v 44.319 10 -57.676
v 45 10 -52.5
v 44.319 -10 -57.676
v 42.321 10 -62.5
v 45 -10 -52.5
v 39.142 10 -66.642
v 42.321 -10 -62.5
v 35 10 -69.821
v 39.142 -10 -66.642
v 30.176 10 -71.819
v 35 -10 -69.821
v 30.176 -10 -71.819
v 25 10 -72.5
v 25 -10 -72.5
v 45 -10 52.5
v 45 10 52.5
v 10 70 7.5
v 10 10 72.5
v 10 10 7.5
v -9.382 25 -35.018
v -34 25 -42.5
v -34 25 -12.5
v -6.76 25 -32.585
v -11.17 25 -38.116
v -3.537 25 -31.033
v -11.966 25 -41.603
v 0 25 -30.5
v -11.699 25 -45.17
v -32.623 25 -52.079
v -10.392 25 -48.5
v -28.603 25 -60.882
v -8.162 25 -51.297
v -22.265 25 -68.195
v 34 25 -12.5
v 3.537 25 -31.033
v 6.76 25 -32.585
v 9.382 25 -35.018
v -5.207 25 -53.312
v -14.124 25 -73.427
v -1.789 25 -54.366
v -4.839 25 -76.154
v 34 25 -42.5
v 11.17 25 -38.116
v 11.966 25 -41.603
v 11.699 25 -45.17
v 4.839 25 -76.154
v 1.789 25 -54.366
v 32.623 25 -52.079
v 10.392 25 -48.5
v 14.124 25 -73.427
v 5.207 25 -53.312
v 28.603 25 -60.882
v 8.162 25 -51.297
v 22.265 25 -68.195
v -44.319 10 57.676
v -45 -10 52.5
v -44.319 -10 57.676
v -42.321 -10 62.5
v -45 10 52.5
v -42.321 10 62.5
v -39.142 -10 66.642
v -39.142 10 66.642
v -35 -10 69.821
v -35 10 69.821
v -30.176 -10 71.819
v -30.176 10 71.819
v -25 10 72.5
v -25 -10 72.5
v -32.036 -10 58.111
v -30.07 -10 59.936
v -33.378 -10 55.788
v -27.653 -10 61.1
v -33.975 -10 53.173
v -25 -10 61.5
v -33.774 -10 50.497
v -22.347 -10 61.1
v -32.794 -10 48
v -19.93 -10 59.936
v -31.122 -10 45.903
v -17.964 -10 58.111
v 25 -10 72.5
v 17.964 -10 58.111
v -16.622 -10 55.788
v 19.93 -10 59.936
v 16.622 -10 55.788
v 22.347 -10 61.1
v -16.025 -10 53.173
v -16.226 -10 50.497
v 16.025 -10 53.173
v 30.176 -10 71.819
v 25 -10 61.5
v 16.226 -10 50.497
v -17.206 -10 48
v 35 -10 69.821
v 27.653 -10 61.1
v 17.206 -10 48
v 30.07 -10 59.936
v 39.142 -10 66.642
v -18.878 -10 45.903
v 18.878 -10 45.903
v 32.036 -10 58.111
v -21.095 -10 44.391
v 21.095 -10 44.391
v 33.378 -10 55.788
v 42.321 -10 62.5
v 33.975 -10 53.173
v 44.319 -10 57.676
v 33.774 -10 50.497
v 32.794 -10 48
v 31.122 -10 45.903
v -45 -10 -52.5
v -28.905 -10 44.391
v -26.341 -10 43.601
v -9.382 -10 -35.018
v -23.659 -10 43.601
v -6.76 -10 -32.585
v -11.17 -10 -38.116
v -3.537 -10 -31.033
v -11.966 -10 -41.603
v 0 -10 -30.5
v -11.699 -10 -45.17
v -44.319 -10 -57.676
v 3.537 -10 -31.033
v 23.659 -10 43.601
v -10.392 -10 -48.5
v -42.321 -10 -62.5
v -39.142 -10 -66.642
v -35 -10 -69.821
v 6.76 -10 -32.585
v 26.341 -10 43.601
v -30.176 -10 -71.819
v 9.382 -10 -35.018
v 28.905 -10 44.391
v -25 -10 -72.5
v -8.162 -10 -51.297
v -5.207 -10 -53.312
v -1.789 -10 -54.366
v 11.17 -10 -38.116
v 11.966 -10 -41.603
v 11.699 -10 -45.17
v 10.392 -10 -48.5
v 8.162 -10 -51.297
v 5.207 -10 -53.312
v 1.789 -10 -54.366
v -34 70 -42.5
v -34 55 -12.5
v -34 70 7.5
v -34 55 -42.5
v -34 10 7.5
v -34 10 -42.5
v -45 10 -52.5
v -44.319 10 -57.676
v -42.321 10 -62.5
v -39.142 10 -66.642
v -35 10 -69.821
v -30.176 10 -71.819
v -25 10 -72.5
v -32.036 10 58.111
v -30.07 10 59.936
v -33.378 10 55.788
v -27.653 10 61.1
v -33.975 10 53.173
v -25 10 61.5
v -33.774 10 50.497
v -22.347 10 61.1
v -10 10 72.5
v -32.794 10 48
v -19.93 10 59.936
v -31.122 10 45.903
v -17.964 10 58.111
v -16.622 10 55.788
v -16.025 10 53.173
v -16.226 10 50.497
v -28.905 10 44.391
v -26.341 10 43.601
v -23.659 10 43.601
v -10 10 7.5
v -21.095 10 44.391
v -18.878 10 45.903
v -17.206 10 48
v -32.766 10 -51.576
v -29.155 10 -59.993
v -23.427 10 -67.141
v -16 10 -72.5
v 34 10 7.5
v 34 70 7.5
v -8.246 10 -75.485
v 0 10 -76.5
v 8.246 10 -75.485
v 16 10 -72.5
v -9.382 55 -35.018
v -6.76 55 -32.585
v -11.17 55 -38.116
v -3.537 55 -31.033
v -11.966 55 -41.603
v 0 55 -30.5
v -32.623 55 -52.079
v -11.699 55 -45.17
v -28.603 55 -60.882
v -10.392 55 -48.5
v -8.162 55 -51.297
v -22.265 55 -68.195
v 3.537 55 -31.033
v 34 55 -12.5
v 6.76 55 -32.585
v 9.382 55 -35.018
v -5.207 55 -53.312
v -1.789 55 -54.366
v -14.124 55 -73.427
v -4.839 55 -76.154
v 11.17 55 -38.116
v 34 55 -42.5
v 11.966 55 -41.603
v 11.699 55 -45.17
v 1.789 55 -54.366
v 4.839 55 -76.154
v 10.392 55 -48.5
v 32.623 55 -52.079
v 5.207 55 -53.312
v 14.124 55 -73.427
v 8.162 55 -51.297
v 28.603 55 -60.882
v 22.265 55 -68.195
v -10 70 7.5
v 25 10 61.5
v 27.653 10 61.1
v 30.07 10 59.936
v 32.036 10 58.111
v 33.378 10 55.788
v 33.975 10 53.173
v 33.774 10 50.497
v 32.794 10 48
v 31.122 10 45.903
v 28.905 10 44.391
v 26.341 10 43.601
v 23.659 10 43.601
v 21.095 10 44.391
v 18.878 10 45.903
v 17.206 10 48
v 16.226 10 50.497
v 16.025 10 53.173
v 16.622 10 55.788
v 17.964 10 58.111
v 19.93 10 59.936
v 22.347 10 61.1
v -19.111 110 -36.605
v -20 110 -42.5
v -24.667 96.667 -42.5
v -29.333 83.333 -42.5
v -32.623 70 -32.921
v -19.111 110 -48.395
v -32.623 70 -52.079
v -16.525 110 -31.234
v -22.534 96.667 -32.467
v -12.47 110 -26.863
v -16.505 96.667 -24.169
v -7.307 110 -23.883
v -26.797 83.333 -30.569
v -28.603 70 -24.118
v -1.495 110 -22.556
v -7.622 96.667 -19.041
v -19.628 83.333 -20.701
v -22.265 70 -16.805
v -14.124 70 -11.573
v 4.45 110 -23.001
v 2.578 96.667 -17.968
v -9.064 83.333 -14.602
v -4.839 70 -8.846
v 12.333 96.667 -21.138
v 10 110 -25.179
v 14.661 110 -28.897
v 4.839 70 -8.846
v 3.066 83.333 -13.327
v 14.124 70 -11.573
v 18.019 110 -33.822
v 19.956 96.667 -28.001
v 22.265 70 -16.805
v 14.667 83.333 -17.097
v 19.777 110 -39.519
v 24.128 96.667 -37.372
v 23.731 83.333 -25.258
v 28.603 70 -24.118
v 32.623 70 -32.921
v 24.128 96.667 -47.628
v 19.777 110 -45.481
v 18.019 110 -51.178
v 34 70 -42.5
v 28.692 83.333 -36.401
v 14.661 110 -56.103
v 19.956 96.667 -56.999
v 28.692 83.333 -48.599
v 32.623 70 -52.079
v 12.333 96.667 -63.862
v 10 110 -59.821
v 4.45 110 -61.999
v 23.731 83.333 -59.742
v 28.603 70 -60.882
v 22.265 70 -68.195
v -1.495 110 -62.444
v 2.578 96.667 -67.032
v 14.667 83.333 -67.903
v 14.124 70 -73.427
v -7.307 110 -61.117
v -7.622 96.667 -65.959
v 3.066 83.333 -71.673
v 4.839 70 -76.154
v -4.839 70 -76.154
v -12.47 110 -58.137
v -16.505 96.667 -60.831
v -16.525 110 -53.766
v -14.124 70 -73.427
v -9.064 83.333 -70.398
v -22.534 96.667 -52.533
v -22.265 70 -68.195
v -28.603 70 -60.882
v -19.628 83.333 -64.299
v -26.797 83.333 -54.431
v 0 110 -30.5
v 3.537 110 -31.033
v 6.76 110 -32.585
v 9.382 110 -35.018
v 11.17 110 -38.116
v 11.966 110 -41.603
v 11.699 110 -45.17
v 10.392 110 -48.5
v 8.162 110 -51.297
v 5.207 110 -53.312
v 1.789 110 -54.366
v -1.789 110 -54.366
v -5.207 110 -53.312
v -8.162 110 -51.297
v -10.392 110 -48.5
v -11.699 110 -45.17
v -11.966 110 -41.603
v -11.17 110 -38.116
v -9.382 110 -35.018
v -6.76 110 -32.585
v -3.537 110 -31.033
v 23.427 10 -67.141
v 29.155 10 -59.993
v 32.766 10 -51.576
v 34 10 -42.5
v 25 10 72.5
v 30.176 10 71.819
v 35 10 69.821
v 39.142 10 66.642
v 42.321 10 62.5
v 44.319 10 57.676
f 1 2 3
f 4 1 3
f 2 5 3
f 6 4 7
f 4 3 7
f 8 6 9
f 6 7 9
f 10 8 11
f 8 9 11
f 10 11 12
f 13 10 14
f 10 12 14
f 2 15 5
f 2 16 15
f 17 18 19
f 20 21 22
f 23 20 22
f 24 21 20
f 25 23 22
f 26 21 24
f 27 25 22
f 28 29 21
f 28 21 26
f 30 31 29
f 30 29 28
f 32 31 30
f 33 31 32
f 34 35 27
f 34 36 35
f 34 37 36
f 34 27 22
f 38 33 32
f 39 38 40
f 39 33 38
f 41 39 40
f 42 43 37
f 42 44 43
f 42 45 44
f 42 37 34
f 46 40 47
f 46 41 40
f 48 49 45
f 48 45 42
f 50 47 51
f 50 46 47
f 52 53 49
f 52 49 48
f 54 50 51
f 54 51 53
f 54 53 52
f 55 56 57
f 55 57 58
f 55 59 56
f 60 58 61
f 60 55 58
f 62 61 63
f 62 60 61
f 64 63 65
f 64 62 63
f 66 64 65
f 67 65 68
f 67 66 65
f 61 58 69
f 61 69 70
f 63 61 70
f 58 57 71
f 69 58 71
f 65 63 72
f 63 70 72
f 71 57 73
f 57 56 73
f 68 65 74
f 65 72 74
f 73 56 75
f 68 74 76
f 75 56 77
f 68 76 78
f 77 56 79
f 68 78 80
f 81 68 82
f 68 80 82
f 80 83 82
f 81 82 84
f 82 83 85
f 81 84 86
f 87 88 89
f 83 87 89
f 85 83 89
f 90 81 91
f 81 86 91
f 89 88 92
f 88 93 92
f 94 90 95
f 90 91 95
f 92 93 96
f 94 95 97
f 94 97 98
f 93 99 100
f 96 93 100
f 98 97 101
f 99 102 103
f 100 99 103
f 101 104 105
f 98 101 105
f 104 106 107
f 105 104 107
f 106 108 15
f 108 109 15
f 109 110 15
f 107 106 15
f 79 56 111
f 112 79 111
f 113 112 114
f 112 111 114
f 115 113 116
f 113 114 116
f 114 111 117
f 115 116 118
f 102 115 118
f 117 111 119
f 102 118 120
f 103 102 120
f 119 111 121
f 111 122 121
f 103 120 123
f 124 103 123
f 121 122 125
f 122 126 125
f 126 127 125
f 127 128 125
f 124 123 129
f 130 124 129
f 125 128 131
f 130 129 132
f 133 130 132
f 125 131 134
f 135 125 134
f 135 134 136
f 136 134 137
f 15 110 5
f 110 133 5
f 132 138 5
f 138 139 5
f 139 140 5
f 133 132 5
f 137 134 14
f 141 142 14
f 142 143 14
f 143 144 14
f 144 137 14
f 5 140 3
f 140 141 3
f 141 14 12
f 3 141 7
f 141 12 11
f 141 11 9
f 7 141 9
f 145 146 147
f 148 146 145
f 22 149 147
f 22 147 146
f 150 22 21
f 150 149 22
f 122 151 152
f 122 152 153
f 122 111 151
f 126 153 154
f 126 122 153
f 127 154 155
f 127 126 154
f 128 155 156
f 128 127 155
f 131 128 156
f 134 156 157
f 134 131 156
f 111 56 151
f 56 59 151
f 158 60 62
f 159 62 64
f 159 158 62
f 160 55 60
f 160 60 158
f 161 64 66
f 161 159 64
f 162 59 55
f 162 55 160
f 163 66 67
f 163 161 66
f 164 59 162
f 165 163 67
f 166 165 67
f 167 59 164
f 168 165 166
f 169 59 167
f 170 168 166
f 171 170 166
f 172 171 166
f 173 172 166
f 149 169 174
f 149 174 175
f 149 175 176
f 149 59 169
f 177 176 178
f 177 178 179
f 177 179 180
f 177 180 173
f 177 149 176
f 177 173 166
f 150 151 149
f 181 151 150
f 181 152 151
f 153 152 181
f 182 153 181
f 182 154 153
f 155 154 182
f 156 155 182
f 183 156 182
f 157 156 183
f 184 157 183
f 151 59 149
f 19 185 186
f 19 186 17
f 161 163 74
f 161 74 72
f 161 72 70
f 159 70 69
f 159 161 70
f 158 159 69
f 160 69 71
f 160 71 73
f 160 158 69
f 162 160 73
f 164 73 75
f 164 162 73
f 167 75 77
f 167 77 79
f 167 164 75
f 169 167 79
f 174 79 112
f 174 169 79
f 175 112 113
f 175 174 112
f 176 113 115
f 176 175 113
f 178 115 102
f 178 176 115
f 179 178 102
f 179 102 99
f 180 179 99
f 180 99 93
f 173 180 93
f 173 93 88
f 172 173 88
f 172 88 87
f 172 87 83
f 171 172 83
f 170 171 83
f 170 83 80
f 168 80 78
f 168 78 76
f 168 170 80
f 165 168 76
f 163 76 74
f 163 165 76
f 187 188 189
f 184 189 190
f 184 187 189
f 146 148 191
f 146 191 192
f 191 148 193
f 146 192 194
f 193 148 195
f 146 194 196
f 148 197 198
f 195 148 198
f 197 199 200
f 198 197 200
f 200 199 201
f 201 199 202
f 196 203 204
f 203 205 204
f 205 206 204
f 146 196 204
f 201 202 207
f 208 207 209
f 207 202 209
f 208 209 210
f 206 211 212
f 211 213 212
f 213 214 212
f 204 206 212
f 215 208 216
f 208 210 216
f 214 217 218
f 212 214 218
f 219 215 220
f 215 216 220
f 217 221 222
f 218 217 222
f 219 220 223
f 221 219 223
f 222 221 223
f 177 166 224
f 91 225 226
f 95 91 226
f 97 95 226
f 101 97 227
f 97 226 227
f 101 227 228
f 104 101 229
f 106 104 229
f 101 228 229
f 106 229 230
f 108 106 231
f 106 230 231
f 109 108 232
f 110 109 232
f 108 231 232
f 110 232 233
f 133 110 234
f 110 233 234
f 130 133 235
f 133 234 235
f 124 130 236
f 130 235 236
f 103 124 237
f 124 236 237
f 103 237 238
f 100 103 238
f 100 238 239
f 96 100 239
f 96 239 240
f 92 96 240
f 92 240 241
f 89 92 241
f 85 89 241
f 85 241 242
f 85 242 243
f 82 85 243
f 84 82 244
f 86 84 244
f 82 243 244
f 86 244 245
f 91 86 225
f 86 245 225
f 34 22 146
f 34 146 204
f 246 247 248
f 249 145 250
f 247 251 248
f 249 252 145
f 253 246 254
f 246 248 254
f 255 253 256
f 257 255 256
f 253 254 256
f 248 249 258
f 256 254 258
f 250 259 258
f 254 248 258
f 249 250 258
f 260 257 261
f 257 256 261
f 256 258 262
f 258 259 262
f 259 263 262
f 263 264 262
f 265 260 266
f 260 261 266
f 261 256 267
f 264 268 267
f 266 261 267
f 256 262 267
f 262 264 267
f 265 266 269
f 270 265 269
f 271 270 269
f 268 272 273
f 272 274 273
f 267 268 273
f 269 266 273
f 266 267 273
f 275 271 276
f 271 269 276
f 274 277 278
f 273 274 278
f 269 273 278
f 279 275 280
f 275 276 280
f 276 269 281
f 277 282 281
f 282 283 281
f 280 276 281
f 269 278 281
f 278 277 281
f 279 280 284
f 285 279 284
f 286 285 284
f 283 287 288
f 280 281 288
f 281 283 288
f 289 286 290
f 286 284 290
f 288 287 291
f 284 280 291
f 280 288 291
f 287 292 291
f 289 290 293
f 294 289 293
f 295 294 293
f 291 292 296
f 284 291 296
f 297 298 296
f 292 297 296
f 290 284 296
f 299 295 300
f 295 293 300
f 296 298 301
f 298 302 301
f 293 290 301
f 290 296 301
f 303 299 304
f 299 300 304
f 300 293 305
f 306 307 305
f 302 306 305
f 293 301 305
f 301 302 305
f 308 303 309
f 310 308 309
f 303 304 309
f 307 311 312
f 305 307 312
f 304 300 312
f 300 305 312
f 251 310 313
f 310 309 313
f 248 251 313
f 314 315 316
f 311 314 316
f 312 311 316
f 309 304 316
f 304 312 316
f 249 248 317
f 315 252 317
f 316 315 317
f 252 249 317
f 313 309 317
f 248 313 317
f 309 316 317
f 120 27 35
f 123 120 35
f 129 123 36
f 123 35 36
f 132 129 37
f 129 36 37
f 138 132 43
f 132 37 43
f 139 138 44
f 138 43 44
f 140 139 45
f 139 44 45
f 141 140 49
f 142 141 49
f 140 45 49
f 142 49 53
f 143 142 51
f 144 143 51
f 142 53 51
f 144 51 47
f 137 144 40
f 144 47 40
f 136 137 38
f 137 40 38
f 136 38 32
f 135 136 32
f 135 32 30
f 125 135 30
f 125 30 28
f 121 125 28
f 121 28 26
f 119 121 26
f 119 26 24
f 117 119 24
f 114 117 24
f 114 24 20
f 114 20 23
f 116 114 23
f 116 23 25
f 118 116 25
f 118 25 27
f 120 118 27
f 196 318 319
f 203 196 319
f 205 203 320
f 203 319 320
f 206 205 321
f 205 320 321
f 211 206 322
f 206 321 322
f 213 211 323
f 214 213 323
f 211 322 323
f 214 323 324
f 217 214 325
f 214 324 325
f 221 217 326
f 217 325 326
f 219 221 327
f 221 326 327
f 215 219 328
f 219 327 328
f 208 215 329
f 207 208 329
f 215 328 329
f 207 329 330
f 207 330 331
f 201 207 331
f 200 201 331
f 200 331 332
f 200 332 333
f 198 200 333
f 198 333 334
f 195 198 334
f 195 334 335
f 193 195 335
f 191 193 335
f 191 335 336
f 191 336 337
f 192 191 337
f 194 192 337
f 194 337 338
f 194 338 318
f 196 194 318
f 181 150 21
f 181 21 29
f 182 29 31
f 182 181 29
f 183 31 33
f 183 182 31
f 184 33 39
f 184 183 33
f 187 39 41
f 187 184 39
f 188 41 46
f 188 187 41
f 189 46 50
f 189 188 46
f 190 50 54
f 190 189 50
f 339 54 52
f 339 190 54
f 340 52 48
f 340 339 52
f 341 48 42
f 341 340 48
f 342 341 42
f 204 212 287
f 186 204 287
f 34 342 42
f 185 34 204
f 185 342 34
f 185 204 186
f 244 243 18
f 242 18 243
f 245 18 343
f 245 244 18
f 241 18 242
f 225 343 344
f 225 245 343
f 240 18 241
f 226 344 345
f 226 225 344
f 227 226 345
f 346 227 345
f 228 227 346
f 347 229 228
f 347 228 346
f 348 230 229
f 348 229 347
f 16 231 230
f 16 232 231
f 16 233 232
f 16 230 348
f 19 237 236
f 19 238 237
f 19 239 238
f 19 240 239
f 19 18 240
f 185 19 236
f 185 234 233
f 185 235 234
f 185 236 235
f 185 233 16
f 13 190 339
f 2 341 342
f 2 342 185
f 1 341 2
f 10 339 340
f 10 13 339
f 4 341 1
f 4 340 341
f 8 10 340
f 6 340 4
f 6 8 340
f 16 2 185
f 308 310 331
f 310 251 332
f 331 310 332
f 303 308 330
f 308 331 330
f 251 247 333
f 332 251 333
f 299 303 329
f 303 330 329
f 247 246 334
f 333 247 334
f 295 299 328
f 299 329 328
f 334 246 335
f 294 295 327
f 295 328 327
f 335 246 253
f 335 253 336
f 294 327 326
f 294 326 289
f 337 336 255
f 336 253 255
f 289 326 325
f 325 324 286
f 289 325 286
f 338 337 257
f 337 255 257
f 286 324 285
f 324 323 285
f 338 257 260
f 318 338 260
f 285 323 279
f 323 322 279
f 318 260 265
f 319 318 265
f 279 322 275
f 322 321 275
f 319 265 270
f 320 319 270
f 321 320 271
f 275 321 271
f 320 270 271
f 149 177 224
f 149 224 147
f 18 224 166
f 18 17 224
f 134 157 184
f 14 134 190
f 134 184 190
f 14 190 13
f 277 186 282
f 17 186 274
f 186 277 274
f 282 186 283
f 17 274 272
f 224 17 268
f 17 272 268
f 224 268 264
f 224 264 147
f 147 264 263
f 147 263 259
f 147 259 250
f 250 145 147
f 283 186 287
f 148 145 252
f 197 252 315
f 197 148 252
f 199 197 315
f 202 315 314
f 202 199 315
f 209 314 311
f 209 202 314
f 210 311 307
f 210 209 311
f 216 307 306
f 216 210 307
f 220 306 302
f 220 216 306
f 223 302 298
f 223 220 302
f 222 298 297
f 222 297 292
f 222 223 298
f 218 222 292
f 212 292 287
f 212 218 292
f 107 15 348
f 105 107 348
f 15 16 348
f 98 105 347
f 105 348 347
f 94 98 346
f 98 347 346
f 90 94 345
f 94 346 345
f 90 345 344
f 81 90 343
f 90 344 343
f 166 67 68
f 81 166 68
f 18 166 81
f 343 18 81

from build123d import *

# Parameters (mm, degrees)
SKETCH1_W           = 90
SKETCH1_H           = 145
BOSS_EXTRUDE2_DEPTH = 10
FILLET2_R           = 20
BOSS_EXTRUDE6_DEPTH = 60
CUT_EXTRUDE1_START  = -45
CUT_EXTRUDE1_DEPTH  = 30
SKETCH13_R          = 12
CUT_EXTRUDE2_DEPTH  = 127
BOSS_EXTRUDE8_DEPTH = 10
SKETCH17_R          = 9
CUT_EXTRUDE3_DEPTH  = 20


with BuildPart() as part:
    # Sketch1 → Boss-Extrude2 (new, symmetric)
    with BuildSketch(Plane(origin=(0, 0, 0), x_dir=(1, 0, 0), z_dir=(0, 1, 0))):
        Rectangle(SKETCH1_W, SKETCH1_H)
    extrude(amount=BOSS_EXTRUDE2_DEPTH, both=True)

    # Fillet2
    fillet2_edges = [part.edges().sort_by_distance(p)[0] for p in [
        (45, 0, -72.5),
        (45, 0, 72.5),
        (-45, 0, 72.5),
        (-45, 0, -72.5),
    ]]
    fillet(fillet2_edges, radius=FILLET2_R)

    # Sketch8 → Boss-Extrude6 (add)
    with BuildSketch(Plane(origin=(0, 10, 0), x_dir=(1, 0, 0), z_dir=(0, 1, 0))):
        with BuildLine():
            Line((-34, -7.5), (-34, 42.5))
            ThreePointArc((-34, 42.5), (0, 76.5), (34, 42.5))
            Line((34, 42.5), (34, -7.5))
            Line((34, -7.5), (-34, -7.5))
        make_face()
    extrude(amount=BOSS_EXTRUDE6_DEPTH)

    # Sketch9 → Cut-Extrude1 (cut)
    with BuildSketch(Plane(origin=(0, 70, 0), x_dir=(1, 0, 0), z_dir=(0, 1, 0)).offset(CUT_EXTRUDE1_START)):
        with BuildLine():
            Line((-34, 42.5), (-34, 12.5))
            Line((-34, 12.5), (34, 12.5))
            Line((34, 12.5), (34, 42.5))
            ThreePointArc((34, 42.5), (0, 76.5), (-34, 42.5))
        make_face()
    extrude(amount=CUT_EXTRUDE1_DEPTH, mode=Mode.SUBTRACT)

    # Sketch12 → Revolve1 (revolve)
    with BuildSketch(Plane.XY.offset(-42.5), mode=Mode.PRIVATE) as revolve1_sk:
        Polygon((0, 70), (0, 110), (20, 110), (34, 70), align=None)
    revolve(revolve1_sk.sketch.rotate(Axis((0, 70, -42.5), (0, 1, 0)), 180), axis=Axis((0, 70, -42.5), (0, 1, 0)))

    # Sketch13 → Cut-Extrude2 (cut)
    with BuildSketch(Plane(origin=(0, 110, 0), x_dir=(1, 0, 0), z_dir=(0, 1, 0))):
        with Locations(Location((0, 42.5, 0), (0, 0, 270))):
            Circle(SKETCH13_R)
    extrude(amount=-CUT_EXTRUDE2_DEPTH, mode=Mode.SUBTRACT)

    # Sketch16 → Boss-Extrude8 (add, symmetric)
    with BuildSketch(Plane(origin=(0, 0, 0), x_dir=(0, 0, -1), z_dir=(1, 0, 0))):
        Polygon((-7.5, 70), (-72.5, 10), (-7.5, 10), align=None)
    extrude(amount=BOSS_EXTRUDE8_DEPTH, both=True)

    # Sketch17 → Cut-Extrude3 (cut)
    with BuildSketch(Plane(origin=(0, 10, 0), x_dir=(1, 0, 0), z_dir=(0, 1, 0))):
        with Locations(Location((25, -52.5, 0), (0, 0, 270))):
            Circle(SKETCH17_R)
    cut_extrude3 = extrude(amount=-CUT_EXTRUDE3_DEPTH, mode=Mode.SUBTRACT)

    # Mirror1: Cut-Extrude3 across plane
    add(cut_extrude3.mirror(Plane(origin=(0, 0, 0), x_dir=(0, 0, 1), z_dir=(1, 0, 0))), mode=Mode.SUBTRACT)


solid = part.part
